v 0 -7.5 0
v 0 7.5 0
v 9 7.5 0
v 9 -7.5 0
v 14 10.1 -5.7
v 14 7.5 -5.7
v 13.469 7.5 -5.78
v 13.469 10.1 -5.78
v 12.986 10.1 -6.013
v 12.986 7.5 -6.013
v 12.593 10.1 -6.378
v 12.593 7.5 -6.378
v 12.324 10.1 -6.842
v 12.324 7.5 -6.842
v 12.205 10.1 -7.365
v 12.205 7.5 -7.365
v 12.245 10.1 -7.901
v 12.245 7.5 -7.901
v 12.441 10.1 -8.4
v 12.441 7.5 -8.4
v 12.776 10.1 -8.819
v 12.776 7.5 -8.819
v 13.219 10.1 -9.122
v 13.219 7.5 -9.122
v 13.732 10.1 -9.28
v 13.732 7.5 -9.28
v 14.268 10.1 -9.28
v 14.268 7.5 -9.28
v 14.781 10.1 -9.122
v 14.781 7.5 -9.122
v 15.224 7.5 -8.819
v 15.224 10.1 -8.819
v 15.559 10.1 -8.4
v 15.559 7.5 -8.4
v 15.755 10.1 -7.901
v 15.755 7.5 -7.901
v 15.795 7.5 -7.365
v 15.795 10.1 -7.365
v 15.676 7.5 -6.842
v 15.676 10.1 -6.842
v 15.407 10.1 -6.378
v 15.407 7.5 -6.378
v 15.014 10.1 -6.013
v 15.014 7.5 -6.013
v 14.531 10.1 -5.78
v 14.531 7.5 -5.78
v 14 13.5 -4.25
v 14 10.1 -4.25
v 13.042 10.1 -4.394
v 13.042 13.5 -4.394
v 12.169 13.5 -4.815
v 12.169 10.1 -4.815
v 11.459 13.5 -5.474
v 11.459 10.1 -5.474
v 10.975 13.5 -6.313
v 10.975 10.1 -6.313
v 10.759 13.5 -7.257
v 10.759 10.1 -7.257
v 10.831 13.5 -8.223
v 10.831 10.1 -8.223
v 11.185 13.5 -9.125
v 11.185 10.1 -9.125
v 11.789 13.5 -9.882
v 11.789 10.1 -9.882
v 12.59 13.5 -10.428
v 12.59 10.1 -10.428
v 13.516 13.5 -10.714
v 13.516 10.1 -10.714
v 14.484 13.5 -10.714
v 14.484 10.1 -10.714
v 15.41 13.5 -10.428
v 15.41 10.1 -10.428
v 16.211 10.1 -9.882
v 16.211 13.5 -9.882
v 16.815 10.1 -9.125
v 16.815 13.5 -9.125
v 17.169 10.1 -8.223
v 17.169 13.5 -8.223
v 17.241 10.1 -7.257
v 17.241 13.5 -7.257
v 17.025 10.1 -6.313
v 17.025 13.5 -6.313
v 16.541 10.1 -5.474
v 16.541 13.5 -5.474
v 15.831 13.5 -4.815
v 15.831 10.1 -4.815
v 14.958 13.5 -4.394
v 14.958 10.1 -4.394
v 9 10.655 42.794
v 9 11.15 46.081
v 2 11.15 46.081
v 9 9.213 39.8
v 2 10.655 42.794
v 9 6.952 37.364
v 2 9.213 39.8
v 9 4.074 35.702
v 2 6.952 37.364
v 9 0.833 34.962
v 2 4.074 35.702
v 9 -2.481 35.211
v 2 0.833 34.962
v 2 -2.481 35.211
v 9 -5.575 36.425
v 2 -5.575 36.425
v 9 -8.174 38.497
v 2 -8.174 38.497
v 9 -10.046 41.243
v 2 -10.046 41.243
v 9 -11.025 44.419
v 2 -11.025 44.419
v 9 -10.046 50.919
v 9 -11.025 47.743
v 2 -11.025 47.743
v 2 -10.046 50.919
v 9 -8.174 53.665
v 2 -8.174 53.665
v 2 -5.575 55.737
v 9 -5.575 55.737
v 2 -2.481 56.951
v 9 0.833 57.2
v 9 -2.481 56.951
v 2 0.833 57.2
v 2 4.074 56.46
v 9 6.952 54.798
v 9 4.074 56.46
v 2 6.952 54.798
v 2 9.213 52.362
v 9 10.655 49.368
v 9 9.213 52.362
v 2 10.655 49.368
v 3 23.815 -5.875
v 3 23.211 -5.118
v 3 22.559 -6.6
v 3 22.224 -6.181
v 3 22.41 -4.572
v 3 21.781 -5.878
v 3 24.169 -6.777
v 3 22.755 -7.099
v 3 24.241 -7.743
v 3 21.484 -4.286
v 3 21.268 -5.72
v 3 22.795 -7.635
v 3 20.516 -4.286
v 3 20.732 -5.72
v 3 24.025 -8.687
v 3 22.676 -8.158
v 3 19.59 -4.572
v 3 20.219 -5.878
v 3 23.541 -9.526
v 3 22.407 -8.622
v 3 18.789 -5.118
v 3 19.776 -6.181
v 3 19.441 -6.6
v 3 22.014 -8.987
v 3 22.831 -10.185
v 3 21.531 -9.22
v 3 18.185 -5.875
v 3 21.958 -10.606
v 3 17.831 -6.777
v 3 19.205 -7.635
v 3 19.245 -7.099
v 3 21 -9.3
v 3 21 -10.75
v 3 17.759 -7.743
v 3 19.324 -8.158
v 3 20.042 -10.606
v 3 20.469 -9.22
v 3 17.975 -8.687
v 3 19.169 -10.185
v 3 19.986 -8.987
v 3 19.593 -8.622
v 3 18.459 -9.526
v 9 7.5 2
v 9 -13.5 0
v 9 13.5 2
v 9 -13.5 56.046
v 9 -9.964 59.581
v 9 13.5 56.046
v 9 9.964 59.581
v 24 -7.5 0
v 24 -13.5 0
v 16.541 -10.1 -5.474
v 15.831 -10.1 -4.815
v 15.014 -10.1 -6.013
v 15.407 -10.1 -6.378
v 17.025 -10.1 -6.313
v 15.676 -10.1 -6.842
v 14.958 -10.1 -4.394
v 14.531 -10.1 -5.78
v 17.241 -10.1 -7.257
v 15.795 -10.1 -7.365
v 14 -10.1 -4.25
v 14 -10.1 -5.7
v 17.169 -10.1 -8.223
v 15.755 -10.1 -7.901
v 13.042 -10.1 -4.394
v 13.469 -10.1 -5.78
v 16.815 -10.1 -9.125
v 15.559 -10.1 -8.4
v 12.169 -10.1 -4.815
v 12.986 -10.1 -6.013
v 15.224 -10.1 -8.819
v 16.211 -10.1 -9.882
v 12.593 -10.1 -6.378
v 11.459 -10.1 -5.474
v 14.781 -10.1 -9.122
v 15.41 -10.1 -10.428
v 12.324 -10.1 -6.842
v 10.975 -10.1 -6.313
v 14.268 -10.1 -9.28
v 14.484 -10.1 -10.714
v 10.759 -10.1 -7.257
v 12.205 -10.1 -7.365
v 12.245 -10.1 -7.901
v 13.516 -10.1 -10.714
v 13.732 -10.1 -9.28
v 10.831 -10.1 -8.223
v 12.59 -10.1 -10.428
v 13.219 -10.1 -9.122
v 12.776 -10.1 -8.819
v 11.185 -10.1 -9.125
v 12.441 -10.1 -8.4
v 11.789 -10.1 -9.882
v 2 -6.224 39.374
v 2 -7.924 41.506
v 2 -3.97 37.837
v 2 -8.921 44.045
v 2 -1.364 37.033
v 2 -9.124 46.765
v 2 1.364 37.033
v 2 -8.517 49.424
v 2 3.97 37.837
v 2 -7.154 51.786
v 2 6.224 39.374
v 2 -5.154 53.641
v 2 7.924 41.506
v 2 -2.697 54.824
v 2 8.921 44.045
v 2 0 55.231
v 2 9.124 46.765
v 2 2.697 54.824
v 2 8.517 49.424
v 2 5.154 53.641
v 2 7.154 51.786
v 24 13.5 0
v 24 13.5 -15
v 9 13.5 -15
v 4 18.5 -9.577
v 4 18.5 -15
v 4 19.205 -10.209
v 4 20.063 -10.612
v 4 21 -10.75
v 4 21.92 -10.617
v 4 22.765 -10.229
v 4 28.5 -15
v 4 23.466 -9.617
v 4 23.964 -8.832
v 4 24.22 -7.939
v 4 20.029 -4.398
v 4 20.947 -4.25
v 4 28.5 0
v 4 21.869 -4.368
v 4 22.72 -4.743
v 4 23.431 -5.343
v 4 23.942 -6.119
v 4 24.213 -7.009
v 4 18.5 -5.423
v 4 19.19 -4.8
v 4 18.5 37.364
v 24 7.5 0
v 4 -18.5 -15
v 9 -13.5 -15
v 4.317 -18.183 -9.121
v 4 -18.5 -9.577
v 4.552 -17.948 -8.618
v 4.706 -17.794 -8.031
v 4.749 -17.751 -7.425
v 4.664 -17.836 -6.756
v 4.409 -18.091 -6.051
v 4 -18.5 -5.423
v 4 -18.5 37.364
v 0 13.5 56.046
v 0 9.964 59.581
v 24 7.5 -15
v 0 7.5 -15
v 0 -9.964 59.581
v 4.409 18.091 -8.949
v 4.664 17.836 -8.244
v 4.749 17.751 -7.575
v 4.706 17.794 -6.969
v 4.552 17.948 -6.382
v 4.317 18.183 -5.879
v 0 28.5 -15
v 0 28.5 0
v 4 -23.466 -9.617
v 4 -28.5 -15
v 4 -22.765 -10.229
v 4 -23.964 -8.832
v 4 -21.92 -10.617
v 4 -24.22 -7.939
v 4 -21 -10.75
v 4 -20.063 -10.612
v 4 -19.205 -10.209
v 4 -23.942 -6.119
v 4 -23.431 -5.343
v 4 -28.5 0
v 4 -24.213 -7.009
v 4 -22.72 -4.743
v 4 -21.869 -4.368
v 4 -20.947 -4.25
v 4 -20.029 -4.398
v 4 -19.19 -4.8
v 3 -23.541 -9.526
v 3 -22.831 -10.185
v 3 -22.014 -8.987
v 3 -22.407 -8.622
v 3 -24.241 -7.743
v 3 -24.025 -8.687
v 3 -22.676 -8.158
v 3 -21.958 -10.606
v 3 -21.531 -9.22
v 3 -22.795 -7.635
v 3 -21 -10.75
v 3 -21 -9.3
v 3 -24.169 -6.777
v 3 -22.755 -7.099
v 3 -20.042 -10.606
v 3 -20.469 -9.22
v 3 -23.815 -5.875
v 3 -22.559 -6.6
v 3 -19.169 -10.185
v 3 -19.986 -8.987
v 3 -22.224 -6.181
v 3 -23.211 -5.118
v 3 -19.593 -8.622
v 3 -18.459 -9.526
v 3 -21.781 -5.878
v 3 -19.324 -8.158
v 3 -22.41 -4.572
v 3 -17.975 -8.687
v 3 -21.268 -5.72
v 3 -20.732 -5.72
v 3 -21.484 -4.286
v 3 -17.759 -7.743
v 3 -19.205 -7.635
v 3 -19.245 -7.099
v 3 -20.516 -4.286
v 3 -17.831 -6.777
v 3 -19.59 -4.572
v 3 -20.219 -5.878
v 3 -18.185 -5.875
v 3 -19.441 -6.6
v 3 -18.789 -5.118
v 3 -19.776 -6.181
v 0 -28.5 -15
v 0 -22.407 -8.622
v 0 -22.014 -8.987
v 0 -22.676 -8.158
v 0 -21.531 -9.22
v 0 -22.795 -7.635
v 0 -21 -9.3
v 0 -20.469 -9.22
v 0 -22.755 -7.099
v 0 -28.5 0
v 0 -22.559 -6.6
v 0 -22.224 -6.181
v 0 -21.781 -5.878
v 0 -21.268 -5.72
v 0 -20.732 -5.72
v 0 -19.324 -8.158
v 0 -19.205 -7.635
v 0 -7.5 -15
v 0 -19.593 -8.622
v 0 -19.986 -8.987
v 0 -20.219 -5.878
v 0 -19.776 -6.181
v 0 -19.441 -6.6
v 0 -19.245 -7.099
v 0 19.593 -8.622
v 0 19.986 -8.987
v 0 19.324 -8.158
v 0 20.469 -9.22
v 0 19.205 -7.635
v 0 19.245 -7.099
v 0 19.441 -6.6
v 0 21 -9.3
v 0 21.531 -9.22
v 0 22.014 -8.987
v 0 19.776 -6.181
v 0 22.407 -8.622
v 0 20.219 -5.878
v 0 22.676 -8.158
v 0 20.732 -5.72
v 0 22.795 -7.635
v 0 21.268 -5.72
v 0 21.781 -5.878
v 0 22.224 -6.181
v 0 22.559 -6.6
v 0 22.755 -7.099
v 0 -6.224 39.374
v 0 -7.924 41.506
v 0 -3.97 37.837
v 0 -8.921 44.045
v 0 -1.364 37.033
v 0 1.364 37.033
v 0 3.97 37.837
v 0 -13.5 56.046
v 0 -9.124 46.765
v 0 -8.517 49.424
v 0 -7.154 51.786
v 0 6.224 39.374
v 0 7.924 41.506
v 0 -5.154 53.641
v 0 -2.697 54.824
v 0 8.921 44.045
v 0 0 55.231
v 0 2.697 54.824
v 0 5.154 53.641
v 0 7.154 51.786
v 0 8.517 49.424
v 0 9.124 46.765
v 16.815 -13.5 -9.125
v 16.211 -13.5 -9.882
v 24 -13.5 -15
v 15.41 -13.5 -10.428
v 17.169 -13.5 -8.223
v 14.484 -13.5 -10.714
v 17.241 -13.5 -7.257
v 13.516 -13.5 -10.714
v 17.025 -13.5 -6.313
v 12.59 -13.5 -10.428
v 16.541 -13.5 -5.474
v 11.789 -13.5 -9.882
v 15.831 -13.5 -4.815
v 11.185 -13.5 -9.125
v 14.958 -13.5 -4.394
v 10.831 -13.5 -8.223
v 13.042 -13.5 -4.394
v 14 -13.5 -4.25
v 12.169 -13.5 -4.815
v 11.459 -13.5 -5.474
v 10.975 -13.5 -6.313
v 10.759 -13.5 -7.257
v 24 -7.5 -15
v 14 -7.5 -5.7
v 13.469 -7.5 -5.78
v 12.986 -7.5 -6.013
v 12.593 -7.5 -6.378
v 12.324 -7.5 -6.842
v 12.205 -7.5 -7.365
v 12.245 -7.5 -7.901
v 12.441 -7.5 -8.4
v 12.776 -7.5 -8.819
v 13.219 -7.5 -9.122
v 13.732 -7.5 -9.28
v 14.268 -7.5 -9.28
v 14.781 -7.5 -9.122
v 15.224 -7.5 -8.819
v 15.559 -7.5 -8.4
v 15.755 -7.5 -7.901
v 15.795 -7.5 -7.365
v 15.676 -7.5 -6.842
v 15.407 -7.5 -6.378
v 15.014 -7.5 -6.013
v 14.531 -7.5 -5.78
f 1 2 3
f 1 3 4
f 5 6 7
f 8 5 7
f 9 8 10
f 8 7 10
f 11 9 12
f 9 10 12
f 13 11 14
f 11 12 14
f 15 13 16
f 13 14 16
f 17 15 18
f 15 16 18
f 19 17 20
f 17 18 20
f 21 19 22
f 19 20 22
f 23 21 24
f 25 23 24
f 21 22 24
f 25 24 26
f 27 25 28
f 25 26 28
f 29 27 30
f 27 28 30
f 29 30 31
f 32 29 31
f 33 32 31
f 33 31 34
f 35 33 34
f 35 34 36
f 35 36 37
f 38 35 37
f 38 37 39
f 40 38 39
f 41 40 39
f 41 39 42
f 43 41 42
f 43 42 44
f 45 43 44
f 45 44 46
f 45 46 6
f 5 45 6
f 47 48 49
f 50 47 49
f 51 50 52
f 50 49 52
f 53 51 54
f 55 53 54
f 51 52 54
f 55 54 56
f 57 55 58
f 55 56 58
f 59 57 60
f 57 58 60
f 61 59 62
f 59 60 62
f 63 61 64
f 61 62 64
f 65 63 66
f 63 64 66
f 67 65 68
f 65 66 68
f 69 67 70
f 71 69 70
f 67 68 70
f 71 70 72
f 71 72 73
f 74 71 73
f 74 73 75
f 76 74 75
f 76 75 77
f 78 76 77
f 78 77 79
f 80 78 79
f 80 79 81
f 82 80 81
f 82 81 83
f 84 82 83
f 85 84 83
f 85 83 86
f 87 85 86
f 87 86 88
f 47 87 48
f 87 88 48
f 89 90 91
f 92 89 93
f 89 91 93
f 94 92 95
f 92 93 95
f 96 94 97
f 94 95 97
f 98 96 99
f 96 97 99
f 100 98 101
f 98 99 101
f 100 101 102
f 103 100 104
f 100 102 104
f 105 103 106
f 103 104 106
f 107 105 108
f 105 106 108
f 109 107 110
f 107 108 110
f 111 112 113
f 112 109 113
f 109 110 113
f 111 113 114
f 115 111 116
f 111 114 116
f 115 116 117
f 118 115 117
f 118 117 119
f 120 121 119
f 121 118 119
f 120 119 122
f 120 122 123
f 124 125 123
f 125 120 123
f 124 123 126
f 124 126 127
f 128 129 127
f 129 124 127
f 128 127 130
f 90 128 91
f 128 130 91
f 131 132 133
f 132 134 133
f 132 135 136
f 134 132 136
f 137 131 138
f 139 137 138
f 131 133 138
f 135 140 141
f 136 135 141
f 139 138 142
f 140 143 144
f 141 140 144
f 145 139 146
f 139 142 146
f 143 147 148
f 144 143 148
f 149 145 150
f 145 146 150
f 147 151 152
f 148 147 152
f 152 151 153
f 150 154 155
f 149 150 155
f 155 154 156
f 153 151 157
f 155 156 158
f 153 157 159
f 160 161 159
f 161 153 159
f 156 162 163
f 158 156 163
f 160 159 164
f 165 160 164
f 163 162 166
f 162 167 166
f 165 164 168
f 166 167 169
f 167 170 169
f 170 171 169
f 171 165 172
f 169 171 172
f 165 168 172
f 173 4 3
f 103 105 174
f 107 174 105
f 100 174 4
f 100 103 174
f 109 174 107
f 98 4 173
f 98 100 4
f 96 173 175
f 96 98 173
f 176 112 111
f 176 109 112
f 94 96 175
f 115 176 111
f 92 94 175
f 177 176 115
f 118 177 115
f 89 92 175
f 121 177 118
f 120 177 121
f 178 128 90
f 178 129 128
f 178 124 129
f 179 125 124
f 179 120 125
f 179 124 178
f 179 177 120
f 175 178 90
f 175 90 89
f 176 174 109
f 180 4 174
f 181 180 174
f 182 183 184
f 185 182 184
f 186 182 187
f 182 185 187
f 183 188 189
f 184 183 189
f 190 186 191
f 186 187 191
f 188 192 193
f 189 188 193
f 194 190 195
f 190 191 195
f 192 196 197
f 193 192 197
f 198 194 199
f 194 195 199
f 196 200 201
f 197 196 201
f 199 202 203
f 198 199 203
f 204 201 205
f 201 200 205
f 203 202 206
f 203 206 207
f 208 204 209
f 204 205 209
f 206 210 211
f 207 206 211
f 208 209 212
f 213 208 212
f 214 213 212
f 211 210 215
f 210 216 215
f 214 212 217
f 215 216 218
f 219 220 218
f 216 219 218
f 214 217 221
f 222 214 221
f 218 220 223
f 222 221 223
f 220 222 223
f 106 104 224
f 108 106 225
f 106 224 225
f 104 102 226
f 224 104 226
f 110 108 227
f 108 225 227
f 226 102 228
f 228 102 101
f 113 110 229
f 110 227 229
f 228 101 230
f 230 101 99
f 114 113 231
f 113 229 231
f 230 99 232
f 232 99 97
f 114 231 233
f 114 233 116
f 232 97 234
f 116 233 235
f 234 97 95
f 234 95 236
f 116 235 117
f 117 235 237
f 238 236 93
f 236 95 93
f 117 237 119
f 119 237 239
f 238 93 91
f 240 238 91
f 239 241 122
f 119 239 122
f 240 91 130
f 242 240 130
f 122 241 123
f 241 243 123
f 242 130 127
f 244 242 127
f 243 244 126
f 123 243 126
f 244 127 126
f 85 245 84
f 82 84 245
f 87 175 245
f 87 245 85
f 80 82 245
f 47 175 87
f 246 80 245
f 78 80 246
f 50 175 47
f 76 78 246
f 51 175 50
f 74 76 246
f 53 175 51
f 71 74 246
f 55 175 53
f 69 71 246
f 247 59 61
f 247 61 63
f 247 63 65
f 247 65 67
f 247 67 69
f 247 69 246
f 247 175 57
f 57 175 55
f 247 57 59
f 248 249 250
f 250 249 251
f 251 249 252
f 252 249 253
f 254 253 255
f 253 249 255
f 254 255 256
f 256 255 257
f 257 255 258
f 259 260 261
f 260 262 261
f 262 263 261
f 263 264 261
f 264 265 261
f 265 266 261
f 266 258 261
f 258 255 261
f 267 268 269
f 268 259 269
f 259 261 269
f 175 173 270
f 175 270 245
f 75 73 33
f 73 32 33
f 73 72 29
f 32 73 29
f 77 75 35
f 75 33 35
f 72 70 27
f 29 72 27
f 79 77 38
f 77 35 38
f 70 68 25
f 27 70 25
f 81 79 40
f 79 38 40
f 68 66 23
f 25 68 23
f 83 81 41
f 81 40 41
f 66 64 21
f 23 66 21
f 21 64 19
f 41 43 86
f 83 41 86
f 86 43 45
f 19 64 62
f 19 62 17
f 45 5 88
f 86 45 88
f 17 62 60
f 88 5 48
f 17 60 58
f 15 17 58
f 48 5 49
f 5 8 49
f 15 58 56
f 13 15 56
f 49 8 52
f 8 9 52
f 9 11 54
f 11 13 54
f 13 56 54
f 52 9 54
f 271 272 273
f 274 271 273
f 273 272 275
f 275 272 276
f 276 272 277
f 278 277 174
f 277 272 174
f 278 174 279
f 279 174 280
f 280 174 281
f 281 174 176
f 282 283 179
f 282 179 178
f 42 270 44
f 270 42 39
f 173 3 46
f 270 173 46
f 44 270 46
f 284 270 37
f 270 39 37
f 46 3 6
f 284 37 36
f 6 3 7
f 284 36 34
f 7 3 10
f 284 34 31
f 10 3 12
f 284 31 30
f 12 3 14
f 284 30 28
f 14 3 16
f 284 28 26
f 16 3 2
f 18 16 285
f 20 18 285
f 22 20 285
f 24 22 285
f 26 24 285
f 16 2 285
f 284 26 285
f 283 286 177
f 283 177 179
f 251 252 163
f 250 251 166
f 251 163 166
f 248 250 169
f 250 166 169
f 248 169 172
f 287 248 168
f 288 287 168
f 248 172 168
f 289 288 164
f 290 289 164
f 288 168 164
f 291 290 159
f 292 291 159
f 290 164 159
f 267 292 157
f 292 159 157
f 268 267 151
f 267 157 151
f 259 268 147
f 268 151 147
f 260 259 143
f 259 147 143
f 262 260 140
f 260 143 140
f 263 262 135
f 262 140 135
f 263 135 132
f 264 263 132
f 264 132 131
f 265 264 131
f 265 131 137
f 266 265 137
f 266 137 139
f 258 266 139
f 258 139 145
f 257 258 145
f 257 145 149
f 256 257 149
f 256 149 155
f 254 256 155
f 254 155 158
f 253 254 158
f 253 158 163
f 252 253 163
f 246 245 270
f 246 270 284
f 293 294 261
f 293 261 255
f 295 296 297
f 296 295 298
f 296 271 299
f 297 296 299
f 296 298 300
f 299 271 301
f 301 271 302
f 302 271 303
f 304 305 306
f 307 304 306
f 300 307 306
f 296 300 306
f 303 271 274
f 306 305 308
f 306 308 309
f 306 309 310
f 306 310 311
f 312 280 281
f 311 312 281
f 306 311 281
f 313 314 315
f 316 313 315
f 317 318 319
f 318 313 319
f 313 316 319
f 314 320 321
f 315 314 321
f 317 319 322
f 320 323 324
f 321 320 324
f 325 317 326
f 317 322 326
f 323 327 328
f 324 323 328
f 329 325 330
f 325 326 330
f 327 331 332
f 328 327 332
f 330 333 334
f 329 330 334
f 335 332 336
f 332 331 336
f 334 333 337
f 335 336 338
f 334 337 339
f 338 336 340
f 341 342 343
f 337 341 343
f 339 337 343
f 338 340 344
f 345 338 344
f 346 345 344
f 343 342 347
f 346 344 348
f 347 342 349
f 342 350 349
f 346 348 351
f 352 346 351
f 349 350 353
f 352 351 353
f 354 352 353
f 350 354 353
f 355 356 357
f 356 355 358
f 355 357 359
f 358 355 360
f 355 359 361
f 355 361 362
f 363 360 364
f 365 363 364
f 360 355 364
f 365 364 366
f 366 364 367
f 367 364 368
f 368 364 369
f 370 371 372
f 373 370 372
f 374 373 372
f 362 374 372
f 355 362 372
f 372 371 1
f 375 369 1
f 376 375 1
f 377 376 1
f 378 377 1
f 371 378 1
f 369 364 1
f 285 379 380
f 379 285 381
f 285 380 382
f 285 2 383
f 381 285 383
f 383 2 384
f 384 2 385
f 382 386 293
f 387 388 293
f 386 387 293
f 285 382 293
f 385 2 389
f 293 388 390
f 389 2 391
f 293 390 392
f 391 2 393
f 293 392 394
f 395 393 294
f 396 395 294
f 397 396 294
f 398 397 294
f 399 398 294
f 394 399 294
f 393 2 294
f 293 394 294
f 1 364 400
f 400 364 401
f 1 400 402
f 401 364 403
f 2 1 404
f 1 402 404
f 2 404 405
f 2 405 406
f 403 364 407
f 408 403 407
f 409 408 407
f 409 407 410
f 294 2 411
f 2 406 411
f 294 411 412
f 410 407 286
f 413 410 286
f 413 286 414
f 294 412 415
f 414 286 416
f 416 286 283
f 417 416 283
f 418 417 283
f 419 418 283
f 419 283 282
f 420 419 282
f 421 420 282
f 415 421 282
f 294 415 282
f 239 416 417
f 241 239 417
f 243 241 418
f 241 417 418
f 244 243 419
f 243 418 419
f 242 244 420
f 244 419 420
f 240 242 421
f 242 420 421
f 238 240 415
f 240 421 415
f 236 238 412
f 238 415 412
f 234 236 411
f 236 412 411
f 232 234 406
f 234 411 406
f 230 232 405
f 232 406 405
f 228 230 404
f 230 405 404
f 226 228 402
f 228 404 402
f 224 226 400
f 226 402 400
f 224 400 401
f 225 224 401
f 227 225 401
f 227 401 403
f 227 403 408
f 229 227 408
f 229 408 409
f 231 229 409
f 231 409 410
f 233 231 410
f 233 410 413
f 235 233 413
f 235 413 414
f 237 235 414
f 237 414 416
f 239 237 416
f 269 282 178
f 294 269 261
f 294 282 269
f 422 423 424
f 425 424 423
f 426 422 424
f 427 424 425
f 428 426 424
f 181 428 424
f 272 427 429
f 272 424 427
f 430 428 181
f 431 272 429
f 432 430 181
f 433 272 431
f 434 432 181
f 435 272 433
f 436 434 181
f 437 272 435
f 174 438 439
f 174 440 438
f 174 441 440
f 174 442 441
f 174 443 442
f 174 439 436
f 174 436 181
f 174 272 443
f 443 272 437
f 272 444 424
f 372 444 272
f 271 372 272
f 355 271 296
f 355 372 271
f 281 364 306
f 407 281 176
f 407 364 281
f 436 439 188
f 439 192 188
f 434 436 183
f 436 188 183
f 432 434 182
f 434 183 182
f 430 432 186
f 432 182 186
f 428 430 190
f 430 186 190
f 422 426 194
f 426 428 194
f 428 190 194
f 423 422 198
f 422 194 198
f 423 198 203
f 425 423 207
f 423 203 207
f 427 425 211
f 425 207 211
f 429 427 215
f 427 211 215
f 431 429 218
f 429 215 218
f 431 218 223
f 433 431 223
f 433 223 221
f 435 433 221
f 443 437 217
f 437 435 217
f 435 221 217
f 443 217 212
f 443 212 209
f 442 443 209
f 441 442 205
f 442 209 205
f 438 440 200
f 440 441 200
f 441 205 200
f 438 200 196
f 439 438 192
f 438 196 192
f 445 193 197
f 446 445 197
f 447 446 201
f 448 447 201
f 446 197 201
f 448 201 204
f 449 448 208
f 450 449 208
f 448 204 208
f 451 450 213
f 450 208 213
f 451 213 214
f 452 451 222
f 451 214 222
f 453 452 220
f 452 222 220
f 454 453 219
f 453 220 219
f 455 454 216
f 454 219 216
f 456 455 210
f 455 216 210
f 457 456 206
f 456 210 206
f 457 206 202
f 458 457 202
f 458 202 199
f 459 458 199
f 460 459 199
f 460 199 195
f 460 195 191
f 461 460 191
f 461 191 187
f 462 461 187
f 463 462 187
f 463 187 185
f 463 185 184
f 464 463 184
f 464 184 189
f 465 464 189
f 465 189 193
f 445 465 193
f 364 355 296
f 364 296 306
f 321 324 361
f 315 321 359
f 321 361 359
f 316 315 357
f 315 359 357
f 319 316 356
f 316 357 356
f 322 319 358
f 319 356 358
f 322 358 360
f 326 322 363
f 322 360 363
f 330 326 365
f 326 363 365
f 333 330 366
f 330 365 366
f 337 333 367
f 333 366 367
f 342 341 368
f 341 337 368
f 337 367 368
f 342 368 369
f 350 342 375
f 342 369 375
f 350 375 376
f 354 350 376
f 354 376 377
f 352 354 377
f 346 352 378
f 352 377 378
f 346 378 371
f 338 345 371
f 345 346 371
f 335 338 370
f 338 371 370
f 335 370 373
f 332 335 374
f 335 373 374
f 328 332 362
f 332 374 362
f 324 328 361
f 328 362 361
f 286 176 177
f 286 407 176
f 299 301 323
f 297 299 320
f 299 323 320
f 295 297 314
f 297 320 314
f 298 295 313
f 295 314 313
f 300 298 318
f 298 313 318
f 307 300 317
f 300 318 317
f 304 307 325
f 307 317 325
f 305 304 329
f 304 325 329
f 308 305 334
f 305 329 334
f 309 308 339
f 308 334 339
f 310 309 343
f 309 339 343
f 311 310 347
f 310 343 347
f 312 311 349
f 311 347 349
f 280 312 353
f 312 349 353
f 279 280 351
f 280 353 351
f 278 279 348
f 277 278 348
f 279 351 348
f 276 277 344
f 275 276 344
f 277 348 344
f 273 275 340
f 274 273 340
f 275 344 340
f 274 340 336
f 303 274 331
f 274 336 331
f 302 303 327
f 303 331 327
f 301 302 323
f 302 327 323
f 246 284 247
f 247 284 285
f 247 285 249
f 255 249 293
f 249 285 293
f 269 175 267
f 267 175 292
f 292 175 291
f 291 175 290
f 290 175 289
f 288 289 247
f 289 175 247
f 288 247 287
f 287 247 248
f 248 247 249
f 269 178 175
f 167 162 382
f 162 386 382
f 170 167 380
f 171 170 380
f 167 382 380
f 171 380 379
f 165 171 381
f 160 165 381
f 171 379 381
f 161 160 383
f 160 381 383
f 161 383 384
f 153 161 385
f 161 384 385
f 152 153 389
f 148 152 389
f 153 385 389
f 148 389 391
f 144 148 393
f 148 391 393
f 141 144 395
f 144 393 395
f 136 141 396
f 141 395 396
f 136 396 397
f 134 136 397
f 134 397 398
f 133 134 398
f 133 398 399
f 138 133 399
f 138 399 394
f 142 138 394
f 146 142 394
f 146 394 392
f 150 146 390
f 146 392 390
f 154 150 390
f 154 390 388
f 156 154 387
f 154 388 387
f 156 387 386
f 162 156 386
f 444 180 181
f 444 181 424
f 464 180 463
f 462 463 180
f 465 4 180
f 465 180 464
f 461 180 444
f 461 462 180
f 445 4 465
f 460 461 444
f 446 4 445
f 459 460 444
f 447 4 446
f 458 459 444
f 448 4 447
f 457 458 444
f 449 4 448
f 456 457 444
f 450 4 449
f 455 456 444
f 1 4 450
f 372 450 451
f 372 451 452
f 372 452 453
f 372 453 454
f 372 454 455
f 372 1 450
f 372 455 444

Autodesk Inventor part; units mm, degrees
ref_plane "YZ Plane" through (0, 0, 0) normal (1, 0, 0) x (0, 1, 0)
ref_plane "XZ Plane" through (0, 0, 0) normal (0, 1, 0) x (-1, 0, 0)
ref_plane "XY Plane" through (0, 0, 0) normal (0, 0, 1) x (1, 0, 0)
sketch "Sketch1" plane through (0, 0, 0) normal (1, 0, 0) x (0, 1, 0)
  line L0 (7.5, 0) -> (-7.5, 0)
  line L1 (-7.5, 0) -> (-7.5, -15)
  line L2 (-7.5, -15) -> (-13.5, -15)
  circle A0 centre (0, 46.081) radius 11.15
  line L3 (7.5, 0) -> (7.5, -15)
  line L4 (7.5, -15) -> (13.5, -15)
  line L5 (-13.5, -15) -> (-13.5, 56.0455)
  line L6 (-13.5, 56.0455) -> (-9.9645, 59.581)
  line L7 (-9.9645, 59.581) -> (9.9645, 59.581)
  line L8 (9.9645, 59.581) -> (13.5, 56.0455)
  line L9 (13.5, 56.0455) -> (13.5, -15)
  point P0 (0, 0)
  point P1 (0, 0)
  point P2 (-13.5, 20.5227)
  dimension "d0" = 15
  dimension "d1" = 46.081
  dimension "d2" = 22.3
  dimension "d9" = 45
  dimension "d10" = 13.5
  dimension "d11" = 5
  dimension "d12" = 27
extrude "Extrusion1" add sketch "Sketch1" along normal blind 9
sketch "Sketch2" plane through (0, 0, 0) normal (-1, 0, 0) x (0, 0, 1)
  circle A0 centre (46.081, 0) radius 11.15 projected
  circle A1 centre (46.081, 0) radius 9.15
  point P0 (0, 0)
  dimension "d13" = 2
extrude "Extrusion2" add sketch "Sketch2" against normal blind 2
sketch "Sketch3" plane through (0, 0, 0) normal (-1, 0, 0) x (0, 0, 1)
  circle A0 centre (46.081, 0) radius 9.15 projected
  line L0 (-15, 13.5) -> (56.0455, 13.5) projected
  line L1 (-15, 7.5) -> (-15, 13.5) projected
  line L2 (0, 7.5) -> (-15, 7.5) projected
  line L3 (0, -7.5) -> (0, 7.5) projected
  line L4 (-15, -7.5) -> (0, -7.5) projected
  line L5 (-15, -13.5) -> (-15, -7.5) projected
  line L6 (56.0455, -13.5) -> (-15, -13.5) projected
  line L7 (59.581, -9.9645) -> (56.0455, -13.5) projected
  line L8 (59.581, 9.9645) -> (59.581, -9.9645) projected
  line L9 (56.0455, 13.5) -> (59.581, 9.9645) projected
  line L10 (-15, -13.5) -> (-15, -7.5) projected
  line L11 (-15, -13.5) -> (-15, -28.5)
  line L12 (-15, -28.5) -> (0, -28.5)
  line L13 (56.0455, -13.5) -> (-15, -13.5) projected
  line L14 (0, -28.5) -> (56.0455, -13.5)
  line L15 (-15, 13.5) -> (56.0455, 13.5) projected
  line L16 (56.0455, 13.5) -> (0, 28.5)
  line L17 (0, 28.5) -> (-15, 28.5)
  line L18 (-15, 28.5) -> (-15, 13.5)
  point P0 (0, 0)
  dimension "d16" = 15
  dimension "d17" = 15
extrude "Extrusion3" add sketch "Sketch3" against normal blind 4 contours L18 L17 L16 L0 | L14 L12 L11 L6
sketch "Sketch4" plane through (9, 0, 0) normal (1, 0, 0) x (0, 0, -1)
  line L0 (15, 13.5) -> (-56.0455, 13.5) projected
  line L1 (15, 7.5) -> (15, 13.5) projected
  line L2 (0, 7.5) -> (15, 7.5) projected
  line L3 (0, -7.5) -> (0, 7.5) projected
  line L4 (15, -7.5) -> (0, -7.5) projected
  line L5 (15, -13.5) -> (15, -7.5) projected
  line L6 (-56.0455, -13.5) -> (15, -13.5) projected
  line L7 (0, -7.5) -> (0, -13.5)
  line L8 (0, 7.5) -> (15, 7.5) projected
  line L9 (0, 7.5) -> (0, 13.5)
  point P0 (0, 0)
extrude "Extrusion4" add sketch "Sketch4" along normal blind 15
chamfer "Chamfer2" distance 2 distance2 15 1 edges at (9, 10.5, 0) measured on face at (9, 0.448, 11.6708)
sketch "Sketch5" plane through (24, 13.5, 0) normal (0, 1, 0) x (1, 0, 0)
  line L0 (0, 0) -> (-15, -2) projected
  line L1 (0, 15) -> (0, 0) projected
  line L2 (-20, 15) -> (0, 15) projected
  line L3 (-20, 15) -> (-20, -56.0455) projected
  line L4 (-20, -56.0455) -> (-15, -56.0455) projected
  line L5 (-15, -2) -> (-15, -56.0455) projected
  point P0 (-24, 0)
  point P1 (-10, 7.5)
  point P2 (-10, 15)
  point P3 (0, 7.5)
hole "Hole1" at (14, 13.5, -7.5) direction (0, -1, 0) diameter 3.6 end through all counterbore diameter 6.5 counterbore depth 3.4 clearance for "Socket Head Cap Screw DIN EN ISO 4762" size "M3" standard "DIN"
sketch "Sketch7" plane through (4, 0, 0) normal (1, 0, 0) x (0, 0, -1)
  line L0 (15, 28.5) -> (0, 28.5) projected
  line L1 (0, 28.5) -> (-56.0455, 13.5) projected
  line L2 (15, 13.5) -> (-56.0455, 13.5) projected
  line L3 (15, 13.5) -> (15, 28.5) projected
  point P0 (0, 0)
  point P1 (7.5, 21)
  point P2 (7.5, 28.5)
  point P3 (15, 21)
hole "Hole3" at (4, 21, -7.5) direction (-1, 0, 0) diameter 3.6 end through all counterbore diameter 6.5 counterbore depth 1 clearance for "Socket Head Cap Screw DIN EN ISO 4762" size "M3" standard "DIN"
mirror "Mirror1" about plane through (0, 0, 0) normal (0, 1, 0) of "Hole3", "Hole1"
chamfer "Chamfer6" distance 5 angle 45 2 edges at (4, 13.5, 20.5227) (4, -13.5, 20.5227)
properties part number "Rear Z Axis Top Bearing" material "ABS Plastic"
